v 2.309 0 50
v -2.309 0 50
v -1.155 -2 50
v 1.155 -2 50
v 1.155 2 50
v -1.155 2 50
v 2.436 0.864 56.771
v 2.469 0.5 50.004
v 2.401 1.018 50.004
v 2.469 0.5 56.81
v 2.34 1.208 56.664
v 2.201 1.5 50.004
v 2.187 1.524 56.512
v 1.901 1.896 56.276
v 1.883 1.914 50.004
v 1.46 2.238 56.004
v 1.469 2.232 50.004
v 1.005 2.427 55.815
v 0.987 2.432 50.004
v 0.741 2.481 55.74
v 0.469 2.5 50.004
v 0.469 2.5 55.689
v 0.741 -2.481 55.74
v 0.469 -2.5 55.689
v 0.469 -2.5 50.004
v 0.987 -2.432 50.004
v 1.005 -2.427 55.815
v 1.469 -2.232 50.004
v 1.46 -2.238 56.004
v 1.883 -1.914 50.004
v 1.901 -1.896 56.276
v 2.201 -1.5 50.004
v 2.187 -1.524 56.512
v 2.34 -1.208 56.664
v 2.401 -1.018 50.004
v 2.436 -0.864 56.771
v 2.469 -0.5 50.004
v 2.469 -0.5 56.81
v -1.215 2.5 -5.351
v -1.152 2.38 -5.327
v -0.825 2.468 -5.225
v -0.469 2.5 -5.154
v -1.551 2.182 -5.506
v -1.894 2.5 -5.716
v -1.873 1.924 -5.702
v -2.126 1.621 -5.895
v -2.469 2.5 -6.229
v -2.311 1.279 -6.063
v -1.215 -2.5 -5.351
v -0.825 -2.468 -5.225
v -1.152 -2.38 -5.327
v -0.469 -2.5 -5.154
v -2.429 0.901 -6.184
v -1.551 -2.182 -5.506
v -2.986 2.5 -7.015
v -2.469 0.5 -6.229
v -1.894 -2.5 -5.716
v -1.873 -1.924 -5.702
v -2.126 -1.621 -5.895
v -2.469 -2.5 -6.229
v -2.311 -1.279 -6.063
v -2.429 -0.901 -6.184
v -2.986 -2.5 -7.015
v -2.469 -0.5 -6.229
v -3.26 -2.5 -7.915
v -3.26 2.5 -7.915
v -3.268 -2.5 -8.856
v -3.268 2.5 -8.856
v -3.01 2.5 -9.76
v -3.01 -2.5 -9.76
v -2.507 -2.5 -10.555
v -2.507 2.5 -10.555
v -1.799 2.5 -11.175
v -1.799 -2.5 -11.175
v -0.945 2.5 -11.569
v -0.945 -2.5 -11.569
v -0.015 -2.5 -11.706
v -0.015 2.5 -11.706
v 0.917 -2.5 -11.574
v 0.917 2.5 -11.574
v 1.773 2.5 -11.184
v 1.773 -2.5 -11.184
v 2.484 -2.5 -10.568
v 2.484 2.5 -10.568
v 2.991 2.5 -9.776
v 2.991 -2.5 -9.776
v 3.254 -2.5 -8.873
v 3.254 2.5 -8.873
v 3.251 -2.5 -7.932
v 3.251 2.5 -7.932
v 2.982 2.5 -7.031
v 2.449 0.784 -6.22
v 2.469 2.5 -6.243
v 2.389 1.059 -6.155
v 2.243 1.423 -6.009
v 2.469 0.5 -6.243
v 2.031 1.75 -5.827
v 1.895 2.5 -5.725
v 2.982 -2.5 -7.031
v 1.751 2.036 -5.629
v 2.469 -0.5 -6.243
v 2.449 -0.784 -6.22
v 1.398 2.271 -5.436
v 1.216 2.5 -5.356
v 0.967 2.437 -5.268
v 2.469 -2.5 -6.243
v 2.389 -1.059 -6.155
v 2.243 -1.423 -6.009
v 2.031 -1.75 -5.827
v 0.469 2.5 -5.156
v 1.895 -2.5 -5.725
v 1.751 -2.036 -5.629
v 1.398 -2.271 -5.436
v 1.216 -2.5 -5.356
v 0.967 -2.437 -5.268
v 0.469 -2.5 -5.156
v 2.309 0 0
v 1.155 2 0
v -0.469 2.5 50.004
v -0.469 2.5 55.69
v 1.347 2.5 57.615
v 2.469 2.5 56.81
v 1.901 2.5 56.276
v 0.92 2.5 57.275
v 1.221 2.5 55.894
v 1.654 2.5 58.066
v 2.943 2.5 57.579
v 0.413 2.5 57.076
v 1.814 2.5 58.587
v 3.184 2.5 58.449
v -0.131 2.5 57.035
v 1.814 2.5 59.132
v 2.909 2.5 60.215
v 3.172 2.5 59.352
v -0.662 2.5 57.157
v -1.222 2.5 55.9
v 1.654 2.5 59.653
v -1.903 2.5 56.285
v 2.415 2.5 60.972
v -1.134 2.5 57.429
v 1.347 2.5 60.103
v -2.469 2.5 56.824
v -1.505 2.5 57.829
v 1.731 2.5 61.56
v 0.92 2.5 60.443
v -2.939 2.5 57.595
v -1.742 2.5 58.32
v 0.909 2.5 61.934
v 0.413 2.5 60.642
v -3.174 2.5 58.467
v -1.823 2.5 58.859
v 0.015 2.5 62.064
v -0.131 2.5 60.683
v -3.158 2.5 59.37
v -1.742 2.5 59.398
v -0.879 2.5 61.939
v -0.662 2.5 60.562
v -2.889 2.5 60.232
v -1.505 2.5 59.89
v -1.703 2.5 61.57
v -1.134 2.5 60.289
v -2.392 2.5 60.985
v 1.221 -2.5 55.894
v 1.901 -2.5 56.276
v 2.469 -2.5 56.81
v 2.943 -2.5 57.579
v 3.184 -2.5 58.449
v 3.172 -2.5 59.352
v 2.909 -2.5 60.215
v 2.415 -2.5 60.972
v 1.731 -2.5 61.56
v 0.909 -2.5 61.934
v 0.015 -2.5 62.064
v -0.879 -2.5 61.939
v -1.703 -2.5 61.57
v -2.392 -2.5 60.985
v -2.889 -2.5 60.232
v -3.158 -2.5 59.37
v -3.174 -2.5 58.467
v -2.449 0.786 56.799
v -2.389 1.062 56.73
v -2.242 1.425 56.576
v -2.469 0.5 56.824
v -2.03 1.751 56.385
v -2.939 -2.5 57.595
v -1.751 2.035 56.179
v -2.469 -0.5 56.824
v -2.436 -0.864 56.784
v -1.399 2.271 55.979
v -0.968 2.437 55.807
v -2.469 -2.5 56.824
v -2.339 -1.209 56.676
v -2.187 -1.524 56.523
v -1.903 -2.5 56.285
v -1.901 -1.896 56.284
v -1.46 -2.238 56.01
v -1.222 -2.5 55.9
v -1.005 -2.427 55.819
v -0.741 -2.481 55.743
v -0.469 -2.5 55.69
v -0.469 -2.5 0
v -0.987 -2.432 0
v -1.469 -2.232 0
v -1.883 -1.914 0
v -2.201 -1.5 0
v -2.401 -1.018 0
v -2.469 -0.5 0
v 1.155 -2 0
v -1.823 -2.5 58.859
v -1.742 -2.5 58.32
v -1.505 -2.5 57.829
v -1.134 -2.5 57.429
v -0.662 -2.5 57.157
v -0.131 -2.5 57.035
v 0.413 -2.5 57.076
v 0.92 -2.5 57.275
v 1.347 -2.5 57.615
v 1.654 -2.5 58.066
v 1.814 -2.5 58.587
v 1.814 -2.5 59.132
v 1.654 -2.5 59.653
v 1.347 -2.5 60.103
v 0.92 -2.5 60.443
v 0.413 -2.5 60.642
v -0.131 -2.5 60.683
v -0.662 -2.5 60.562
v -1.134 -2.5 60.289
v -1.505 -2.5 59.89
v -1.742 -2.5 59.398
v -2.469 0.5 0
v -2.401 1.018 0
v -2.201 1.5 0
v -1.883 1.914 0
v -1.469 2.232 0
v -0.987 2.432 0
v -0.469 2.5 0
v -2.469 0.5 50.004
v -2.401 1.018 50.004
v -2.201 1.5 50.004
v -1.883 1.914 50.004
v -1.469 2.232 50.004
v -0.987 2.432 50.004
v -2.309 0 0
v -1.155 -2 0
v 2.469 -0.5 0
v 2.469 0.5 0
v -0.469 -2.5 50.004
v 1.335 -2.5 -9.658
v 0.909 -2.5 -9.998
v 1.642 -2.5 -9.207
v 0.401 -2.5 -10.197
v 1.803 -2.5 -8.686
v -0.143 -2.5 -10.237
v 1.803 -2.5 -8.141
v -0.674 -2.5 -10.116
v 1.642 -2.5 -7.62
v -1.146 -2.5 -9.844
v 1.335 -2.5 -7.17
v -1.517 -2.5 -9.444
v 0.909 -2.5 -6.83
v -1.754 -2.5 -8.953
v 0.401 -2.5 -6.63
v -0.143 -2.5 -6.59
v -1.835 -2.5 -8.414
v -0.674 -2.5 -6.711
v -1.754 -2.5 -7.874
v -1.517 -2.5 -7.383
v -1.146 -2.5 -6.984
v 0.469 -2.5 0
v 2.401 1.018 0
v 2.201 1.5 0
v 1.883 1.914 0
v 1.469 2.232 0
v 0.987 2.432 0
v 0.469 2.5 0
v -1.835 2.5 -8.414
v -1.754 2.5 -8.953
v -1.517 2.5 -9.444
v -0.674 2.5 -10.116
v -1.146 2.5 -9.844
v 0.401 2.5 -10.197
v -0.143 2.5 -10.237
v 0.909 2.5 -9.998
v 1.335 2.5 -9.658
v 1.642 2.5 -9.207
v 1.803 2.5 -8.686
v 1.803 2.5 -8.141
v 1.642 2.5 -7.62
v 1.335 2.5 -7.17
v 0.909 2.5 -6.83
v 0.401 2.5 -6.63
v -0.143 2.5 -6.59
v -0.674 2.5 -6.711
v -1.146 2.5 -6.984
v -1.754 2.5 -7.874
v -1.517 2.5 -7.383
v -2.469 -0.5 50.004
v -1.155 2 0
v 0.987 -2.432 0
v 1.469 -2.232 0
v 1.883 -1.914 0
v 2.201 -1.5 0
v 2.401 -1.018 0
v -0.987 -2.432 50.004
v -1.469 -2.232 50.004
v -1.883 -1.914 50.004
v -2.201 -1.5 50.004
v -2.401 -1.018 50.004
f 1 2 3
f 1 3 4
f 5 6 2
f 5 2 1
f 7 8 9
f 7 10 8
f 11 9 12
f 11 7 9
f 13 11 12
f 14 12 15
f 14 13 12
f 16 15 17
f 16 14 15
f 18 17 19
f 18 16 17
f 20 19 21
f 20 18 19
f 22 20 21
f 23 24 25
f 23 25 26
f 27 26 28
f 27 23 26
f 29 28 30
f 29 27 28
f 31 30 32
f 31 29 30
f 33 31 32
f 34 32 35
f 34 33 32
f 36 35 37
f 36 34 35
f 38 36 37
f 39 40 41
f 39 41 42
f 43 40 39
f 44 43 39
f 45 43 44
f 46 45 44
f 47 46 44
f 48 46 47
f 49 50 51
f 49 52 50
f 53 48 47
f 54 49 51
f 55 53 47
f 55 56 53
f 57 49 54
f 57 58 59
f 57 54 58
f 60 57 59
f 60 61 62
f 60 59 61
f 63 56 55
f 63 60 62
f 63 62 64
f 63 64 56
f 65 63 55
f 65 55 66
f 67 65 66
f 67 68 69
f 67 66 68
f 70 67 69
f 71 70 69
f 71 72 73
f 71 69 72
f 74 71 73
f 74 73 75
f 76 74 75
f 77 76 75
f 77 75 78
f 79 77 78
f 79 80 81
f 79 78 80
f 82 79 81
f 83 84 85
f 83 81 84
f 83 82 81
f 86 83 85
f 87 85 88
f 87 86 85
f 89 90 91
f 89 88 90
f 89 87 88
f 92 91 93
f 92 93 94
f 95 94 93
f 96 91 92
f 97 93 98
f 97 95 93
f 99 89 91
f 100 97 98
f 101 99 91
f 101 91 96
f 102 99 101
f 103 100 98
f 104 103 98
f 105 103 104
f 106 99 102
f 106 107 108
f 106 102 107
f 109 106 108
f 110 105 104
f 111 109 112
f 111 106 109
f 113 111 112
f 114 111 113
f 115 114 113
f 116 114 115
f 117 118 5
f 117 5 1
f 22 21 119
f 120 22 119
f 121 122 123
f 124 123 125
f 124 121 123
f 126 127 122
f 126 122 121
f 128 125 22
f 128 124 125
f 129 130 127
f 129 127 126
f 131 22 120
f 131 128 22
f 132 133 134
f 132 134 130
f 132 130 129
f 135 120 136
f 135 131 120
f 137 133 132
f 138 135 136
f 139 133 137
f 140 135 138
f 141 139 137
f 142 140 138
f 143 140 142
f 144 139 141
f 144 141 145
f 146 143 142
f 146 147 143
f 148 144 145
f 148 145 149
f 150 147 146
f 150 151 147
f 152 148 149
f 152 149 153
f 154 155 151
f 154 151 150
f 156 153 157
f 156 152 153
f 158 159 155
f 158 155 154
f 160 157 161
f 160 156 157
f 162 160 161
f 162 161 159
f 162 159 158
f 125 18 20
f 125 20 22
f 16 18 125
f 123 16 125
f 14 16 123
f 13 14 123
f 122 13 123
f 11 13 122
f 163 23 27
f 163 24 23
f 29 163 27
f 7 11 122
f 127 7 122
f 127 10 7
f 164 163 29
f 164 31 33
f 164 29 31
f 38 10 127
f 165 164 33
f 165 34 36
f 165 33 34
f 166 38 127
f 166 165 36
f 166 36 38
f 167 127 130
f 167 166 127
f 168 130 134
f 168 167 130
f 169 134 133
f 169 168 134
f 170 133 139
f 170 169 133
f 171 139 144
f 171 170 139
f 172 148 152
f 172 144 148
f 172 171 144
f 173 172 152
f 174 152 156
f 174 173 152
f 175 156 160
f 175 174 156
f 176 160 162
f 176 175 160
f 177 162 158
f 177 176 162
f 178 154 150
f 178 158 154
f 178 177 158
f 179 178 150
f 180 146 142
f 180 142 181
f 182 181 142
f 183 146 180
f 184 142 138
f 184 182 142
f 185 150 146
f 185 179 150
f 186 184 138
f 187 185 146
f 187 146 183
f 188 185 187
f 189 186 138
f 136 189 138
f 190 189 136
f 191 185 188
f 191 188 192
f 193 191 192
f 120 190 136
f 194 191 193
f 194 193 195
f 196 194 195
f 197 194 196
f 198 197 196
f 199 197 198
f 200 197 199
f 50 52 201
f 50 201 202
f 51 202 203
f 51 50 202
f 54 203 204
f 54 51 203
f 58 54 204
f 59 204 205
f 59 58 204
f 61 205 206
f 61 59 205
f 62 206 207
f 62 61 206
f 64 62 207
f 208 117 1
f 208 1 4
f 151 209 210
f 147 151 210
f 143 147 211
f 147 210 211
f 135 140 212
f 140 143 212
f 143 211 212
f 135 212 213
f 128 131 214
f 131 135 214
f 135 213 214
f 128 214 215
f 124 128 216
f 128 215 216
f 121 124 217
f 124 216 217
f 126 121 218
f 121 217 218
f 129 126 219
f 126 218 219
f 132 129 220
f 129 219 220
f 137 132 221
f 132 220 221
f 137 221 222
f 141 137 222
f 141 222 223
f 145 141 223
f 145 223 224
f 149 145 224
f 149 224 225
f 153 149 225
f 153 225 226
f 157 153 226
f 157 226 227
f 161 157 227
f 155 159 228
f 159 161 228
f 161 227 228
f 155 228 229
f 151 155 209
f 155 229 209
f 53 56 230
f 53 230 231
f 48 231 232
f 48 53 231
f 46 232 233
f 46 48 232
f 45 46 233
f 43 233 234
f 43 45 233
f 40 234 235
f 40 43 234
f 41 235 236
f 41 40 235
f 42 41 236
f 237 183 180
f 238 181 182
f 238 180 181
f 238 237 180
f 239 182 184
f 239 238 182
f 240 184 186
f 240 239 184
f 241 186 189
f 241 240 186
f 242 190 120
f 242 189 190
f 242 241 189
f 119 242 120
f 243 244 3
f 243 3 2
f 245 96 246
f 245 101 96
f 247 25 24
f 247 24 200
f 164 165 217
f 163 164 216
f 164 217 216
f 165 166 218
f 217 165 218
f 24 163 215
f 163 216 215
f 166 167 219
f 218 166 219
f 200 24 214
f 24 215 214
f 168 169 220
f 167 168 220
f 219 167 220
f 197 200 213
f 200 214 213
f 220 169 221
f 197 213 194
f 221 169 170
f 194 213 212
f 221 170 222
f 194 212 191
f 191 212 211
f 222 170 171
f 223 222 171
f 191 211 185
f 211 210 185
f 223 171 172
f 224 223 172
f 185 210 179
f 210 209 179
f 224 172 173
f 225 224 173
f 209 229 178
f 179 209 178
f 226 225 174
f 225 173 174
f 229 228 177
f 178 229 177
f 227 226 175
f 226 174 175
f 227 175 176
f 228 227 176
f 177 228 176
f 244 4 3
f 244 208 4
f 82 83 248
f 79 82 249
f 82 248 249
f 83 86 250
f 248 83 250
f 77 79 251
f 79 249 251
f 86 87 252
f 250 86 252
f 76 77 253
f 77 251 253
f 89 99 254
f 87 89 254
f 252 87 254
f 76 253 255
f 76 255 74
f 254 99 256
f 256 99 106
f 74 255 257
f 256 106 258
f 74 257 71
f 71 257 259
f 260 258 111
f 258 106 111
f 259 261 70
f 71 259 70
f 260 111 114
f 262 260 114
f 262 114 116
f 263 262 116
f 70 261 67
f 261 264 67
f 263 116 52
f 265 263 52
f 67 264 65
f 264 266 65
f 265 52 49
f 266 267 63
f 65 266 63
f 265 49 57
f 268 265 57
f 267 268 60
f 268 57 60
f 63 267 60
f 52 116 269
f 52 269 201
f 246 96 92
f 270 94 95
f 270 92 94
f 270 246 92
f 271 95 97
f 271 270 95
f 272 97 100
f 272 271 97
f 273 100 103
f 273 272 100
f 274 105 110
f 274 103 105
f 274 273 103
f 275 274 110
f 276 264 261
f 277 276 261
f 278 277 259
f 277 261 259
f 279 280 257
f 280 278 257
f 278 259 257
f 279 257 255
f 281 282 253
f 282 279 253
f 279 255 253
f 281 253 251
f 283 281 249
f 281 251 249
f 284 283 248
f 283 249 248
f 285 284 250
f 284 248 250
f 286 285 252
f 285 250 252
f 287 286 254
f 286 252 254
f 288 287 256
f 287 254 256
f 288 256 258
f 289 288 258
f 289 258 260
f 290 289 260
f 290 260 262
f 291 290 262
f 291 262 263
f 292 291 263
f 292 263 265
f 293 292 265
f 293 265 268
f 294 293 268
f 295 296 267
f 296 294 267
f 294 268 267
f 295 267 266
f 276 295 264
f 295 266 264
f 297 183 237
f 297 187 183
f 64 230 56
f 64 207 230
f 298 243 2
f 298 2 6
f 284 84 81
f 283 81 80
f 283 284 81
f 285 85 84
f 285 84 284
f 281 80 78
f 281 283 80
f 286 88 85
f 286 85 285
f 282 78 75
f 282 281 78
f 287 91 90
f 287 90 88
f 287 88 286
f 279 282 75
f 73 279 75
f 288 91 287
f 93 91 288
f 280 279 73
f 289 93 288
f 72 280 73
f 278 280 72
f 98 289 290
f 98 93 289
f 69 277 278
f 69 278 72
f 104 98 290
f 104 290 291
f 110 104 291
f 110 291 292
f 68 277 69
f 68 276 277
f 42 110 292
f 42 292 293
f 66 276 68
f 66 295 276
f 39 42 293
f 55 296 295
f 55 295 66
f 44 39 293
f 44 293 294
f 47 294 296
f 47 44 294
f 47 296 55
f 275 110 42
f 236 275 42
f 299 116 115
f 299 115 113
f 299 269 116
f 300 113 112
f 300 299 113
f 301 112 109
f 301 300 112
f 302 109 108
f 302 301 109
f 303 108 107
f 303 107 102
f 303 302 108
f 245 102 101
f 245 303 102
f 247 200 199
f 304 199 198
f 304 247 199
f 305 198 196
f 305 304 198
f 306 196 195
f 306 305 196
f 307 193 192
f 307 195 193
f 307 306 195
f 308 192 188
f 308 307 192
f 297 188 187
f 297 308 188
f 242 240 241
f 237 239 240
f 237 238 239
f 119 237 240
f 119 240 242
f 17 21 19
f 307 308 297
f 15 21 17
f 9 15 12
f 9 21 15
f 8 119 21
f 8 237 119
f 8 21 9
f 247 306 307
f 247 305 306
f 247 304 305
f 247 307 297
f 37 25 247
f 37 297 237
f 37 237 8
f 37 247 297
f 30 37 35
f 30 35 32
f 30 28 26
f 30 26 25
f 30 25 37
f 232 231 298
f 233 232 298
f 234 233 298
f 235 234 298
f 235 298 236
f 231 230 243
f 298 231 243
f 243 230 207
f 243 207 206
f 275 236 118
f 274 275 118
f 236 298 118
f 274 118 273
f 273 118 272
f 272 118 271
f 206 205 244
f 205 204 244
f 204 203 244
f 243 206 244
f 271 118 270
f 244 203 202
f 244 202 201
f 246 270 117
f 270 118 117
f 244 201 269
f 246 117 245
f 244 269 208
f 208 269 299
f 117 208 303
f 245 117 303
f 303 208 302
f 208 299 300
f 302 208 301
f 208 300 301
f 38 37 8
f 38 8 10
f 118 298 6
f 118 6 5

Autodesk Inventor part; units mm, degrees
ref_plane "YZ Plane" through (0, 0, 0) normal (1, 0, 0) x (0, 1, 0)
ref_plane "XZ Plane" through (0, 0, 0) normal (0, 1, 0) x (-1, 0, 0)
ref_plane "XY Plane" through (0, 0, 0) normal (0, 0, 1) x (1, 0, 0)
sketch "Sketch1" plane through (0, 0, 0) normal (0, 0, 1) x (1, 0, 0)
  line L0 (2.3094, 0) -> (1.1547, -2)
  line L1 (1.1547, -2) -> (-1.1547, -2)
  line L2 (-1.1547, -2) -> (-2.3094, 0)
  line L3 (-2.3094, 0) -> (-1.1547, 2)
  line L4 (-1.1547, 2) -> (1.1547, 2)
  line L5 (1.1547, 2) -> (2.3094, 0)
  point P0 (0, 0)
  point P1 (0, 0)
  point P2 (0, -2)
  dimension "d0" = 4
extrude "Extrusion1" add sketch "Sketch1" along normal blind 50
sketch "Sketch3" plane through (0, 0, 0) normal (0, 1, 0) x (-1, 0, 0)
  circle A0 centre (0.0059, -8.4136) radius 1.829
  line L0 (2.4692, 0) -> (2.4692, -6.2293)
  line L1 (-2.4692, -6.2426) -> (-2.4692, 0)
  arc A1 (-2.4692, -6.2426) -> (2.4692, -6.2293) centre (0.0059, -8.4136) ccw
  circle A2 centre (-0.0059, 58.8593) radius 1.829
  line L2 (-2.4692, 50.0041) -> (-2.4692, 56.81)
  line L3 (2.4692, 56.8242) -> (2.4692, 50.0041)
  arc A3 (2.4692, 56.8242) -> (-2.4692, 56.81) centre (-0.0059, 58.8593) ccw
  line L4 (1.1547, 50) -> (2.3094, 50) projected
  line L5 (2.4692, 50.0041) -> (-2.4692, 50.0041)
  line L6 (2.4692, 0) -> (-2.4692, 0)
  circle A4 centre (0.0059, -8.4136) radius 1.829
  line L7 (-1.1547, 50) -> (-2.3094, 50) projected
  line L8 (2.3094, 50) -> (-2.3094, 50)
  point P0 (1.1547, 34.4)
  point P1 (2.3094, 34.4)
extrude "Extrusion3" add sketch "Sketch3" along normal mid plane 5 contours L2 A3 L3 L5
extrude "Extrusion4" add sketch "Sketch3" along normal mid plane 5 contours L0 A1 L1 L6
fillet "Fillet1" radius 2 8 edges at (2.4692, 2.5, -3.1213) (-2.4692, 2.5, -3.1146) (2.4692, -2.5, -3.1213) (-2.4692, -2.5, -3.1146) (2.4692, -2.5, 53.407) (2.4692, 2.5, 53.407) (-2.4692, 2.5, 53.4141) (-2.4692, -2.5, 53.4141)
properties part number "PX9200-19"
